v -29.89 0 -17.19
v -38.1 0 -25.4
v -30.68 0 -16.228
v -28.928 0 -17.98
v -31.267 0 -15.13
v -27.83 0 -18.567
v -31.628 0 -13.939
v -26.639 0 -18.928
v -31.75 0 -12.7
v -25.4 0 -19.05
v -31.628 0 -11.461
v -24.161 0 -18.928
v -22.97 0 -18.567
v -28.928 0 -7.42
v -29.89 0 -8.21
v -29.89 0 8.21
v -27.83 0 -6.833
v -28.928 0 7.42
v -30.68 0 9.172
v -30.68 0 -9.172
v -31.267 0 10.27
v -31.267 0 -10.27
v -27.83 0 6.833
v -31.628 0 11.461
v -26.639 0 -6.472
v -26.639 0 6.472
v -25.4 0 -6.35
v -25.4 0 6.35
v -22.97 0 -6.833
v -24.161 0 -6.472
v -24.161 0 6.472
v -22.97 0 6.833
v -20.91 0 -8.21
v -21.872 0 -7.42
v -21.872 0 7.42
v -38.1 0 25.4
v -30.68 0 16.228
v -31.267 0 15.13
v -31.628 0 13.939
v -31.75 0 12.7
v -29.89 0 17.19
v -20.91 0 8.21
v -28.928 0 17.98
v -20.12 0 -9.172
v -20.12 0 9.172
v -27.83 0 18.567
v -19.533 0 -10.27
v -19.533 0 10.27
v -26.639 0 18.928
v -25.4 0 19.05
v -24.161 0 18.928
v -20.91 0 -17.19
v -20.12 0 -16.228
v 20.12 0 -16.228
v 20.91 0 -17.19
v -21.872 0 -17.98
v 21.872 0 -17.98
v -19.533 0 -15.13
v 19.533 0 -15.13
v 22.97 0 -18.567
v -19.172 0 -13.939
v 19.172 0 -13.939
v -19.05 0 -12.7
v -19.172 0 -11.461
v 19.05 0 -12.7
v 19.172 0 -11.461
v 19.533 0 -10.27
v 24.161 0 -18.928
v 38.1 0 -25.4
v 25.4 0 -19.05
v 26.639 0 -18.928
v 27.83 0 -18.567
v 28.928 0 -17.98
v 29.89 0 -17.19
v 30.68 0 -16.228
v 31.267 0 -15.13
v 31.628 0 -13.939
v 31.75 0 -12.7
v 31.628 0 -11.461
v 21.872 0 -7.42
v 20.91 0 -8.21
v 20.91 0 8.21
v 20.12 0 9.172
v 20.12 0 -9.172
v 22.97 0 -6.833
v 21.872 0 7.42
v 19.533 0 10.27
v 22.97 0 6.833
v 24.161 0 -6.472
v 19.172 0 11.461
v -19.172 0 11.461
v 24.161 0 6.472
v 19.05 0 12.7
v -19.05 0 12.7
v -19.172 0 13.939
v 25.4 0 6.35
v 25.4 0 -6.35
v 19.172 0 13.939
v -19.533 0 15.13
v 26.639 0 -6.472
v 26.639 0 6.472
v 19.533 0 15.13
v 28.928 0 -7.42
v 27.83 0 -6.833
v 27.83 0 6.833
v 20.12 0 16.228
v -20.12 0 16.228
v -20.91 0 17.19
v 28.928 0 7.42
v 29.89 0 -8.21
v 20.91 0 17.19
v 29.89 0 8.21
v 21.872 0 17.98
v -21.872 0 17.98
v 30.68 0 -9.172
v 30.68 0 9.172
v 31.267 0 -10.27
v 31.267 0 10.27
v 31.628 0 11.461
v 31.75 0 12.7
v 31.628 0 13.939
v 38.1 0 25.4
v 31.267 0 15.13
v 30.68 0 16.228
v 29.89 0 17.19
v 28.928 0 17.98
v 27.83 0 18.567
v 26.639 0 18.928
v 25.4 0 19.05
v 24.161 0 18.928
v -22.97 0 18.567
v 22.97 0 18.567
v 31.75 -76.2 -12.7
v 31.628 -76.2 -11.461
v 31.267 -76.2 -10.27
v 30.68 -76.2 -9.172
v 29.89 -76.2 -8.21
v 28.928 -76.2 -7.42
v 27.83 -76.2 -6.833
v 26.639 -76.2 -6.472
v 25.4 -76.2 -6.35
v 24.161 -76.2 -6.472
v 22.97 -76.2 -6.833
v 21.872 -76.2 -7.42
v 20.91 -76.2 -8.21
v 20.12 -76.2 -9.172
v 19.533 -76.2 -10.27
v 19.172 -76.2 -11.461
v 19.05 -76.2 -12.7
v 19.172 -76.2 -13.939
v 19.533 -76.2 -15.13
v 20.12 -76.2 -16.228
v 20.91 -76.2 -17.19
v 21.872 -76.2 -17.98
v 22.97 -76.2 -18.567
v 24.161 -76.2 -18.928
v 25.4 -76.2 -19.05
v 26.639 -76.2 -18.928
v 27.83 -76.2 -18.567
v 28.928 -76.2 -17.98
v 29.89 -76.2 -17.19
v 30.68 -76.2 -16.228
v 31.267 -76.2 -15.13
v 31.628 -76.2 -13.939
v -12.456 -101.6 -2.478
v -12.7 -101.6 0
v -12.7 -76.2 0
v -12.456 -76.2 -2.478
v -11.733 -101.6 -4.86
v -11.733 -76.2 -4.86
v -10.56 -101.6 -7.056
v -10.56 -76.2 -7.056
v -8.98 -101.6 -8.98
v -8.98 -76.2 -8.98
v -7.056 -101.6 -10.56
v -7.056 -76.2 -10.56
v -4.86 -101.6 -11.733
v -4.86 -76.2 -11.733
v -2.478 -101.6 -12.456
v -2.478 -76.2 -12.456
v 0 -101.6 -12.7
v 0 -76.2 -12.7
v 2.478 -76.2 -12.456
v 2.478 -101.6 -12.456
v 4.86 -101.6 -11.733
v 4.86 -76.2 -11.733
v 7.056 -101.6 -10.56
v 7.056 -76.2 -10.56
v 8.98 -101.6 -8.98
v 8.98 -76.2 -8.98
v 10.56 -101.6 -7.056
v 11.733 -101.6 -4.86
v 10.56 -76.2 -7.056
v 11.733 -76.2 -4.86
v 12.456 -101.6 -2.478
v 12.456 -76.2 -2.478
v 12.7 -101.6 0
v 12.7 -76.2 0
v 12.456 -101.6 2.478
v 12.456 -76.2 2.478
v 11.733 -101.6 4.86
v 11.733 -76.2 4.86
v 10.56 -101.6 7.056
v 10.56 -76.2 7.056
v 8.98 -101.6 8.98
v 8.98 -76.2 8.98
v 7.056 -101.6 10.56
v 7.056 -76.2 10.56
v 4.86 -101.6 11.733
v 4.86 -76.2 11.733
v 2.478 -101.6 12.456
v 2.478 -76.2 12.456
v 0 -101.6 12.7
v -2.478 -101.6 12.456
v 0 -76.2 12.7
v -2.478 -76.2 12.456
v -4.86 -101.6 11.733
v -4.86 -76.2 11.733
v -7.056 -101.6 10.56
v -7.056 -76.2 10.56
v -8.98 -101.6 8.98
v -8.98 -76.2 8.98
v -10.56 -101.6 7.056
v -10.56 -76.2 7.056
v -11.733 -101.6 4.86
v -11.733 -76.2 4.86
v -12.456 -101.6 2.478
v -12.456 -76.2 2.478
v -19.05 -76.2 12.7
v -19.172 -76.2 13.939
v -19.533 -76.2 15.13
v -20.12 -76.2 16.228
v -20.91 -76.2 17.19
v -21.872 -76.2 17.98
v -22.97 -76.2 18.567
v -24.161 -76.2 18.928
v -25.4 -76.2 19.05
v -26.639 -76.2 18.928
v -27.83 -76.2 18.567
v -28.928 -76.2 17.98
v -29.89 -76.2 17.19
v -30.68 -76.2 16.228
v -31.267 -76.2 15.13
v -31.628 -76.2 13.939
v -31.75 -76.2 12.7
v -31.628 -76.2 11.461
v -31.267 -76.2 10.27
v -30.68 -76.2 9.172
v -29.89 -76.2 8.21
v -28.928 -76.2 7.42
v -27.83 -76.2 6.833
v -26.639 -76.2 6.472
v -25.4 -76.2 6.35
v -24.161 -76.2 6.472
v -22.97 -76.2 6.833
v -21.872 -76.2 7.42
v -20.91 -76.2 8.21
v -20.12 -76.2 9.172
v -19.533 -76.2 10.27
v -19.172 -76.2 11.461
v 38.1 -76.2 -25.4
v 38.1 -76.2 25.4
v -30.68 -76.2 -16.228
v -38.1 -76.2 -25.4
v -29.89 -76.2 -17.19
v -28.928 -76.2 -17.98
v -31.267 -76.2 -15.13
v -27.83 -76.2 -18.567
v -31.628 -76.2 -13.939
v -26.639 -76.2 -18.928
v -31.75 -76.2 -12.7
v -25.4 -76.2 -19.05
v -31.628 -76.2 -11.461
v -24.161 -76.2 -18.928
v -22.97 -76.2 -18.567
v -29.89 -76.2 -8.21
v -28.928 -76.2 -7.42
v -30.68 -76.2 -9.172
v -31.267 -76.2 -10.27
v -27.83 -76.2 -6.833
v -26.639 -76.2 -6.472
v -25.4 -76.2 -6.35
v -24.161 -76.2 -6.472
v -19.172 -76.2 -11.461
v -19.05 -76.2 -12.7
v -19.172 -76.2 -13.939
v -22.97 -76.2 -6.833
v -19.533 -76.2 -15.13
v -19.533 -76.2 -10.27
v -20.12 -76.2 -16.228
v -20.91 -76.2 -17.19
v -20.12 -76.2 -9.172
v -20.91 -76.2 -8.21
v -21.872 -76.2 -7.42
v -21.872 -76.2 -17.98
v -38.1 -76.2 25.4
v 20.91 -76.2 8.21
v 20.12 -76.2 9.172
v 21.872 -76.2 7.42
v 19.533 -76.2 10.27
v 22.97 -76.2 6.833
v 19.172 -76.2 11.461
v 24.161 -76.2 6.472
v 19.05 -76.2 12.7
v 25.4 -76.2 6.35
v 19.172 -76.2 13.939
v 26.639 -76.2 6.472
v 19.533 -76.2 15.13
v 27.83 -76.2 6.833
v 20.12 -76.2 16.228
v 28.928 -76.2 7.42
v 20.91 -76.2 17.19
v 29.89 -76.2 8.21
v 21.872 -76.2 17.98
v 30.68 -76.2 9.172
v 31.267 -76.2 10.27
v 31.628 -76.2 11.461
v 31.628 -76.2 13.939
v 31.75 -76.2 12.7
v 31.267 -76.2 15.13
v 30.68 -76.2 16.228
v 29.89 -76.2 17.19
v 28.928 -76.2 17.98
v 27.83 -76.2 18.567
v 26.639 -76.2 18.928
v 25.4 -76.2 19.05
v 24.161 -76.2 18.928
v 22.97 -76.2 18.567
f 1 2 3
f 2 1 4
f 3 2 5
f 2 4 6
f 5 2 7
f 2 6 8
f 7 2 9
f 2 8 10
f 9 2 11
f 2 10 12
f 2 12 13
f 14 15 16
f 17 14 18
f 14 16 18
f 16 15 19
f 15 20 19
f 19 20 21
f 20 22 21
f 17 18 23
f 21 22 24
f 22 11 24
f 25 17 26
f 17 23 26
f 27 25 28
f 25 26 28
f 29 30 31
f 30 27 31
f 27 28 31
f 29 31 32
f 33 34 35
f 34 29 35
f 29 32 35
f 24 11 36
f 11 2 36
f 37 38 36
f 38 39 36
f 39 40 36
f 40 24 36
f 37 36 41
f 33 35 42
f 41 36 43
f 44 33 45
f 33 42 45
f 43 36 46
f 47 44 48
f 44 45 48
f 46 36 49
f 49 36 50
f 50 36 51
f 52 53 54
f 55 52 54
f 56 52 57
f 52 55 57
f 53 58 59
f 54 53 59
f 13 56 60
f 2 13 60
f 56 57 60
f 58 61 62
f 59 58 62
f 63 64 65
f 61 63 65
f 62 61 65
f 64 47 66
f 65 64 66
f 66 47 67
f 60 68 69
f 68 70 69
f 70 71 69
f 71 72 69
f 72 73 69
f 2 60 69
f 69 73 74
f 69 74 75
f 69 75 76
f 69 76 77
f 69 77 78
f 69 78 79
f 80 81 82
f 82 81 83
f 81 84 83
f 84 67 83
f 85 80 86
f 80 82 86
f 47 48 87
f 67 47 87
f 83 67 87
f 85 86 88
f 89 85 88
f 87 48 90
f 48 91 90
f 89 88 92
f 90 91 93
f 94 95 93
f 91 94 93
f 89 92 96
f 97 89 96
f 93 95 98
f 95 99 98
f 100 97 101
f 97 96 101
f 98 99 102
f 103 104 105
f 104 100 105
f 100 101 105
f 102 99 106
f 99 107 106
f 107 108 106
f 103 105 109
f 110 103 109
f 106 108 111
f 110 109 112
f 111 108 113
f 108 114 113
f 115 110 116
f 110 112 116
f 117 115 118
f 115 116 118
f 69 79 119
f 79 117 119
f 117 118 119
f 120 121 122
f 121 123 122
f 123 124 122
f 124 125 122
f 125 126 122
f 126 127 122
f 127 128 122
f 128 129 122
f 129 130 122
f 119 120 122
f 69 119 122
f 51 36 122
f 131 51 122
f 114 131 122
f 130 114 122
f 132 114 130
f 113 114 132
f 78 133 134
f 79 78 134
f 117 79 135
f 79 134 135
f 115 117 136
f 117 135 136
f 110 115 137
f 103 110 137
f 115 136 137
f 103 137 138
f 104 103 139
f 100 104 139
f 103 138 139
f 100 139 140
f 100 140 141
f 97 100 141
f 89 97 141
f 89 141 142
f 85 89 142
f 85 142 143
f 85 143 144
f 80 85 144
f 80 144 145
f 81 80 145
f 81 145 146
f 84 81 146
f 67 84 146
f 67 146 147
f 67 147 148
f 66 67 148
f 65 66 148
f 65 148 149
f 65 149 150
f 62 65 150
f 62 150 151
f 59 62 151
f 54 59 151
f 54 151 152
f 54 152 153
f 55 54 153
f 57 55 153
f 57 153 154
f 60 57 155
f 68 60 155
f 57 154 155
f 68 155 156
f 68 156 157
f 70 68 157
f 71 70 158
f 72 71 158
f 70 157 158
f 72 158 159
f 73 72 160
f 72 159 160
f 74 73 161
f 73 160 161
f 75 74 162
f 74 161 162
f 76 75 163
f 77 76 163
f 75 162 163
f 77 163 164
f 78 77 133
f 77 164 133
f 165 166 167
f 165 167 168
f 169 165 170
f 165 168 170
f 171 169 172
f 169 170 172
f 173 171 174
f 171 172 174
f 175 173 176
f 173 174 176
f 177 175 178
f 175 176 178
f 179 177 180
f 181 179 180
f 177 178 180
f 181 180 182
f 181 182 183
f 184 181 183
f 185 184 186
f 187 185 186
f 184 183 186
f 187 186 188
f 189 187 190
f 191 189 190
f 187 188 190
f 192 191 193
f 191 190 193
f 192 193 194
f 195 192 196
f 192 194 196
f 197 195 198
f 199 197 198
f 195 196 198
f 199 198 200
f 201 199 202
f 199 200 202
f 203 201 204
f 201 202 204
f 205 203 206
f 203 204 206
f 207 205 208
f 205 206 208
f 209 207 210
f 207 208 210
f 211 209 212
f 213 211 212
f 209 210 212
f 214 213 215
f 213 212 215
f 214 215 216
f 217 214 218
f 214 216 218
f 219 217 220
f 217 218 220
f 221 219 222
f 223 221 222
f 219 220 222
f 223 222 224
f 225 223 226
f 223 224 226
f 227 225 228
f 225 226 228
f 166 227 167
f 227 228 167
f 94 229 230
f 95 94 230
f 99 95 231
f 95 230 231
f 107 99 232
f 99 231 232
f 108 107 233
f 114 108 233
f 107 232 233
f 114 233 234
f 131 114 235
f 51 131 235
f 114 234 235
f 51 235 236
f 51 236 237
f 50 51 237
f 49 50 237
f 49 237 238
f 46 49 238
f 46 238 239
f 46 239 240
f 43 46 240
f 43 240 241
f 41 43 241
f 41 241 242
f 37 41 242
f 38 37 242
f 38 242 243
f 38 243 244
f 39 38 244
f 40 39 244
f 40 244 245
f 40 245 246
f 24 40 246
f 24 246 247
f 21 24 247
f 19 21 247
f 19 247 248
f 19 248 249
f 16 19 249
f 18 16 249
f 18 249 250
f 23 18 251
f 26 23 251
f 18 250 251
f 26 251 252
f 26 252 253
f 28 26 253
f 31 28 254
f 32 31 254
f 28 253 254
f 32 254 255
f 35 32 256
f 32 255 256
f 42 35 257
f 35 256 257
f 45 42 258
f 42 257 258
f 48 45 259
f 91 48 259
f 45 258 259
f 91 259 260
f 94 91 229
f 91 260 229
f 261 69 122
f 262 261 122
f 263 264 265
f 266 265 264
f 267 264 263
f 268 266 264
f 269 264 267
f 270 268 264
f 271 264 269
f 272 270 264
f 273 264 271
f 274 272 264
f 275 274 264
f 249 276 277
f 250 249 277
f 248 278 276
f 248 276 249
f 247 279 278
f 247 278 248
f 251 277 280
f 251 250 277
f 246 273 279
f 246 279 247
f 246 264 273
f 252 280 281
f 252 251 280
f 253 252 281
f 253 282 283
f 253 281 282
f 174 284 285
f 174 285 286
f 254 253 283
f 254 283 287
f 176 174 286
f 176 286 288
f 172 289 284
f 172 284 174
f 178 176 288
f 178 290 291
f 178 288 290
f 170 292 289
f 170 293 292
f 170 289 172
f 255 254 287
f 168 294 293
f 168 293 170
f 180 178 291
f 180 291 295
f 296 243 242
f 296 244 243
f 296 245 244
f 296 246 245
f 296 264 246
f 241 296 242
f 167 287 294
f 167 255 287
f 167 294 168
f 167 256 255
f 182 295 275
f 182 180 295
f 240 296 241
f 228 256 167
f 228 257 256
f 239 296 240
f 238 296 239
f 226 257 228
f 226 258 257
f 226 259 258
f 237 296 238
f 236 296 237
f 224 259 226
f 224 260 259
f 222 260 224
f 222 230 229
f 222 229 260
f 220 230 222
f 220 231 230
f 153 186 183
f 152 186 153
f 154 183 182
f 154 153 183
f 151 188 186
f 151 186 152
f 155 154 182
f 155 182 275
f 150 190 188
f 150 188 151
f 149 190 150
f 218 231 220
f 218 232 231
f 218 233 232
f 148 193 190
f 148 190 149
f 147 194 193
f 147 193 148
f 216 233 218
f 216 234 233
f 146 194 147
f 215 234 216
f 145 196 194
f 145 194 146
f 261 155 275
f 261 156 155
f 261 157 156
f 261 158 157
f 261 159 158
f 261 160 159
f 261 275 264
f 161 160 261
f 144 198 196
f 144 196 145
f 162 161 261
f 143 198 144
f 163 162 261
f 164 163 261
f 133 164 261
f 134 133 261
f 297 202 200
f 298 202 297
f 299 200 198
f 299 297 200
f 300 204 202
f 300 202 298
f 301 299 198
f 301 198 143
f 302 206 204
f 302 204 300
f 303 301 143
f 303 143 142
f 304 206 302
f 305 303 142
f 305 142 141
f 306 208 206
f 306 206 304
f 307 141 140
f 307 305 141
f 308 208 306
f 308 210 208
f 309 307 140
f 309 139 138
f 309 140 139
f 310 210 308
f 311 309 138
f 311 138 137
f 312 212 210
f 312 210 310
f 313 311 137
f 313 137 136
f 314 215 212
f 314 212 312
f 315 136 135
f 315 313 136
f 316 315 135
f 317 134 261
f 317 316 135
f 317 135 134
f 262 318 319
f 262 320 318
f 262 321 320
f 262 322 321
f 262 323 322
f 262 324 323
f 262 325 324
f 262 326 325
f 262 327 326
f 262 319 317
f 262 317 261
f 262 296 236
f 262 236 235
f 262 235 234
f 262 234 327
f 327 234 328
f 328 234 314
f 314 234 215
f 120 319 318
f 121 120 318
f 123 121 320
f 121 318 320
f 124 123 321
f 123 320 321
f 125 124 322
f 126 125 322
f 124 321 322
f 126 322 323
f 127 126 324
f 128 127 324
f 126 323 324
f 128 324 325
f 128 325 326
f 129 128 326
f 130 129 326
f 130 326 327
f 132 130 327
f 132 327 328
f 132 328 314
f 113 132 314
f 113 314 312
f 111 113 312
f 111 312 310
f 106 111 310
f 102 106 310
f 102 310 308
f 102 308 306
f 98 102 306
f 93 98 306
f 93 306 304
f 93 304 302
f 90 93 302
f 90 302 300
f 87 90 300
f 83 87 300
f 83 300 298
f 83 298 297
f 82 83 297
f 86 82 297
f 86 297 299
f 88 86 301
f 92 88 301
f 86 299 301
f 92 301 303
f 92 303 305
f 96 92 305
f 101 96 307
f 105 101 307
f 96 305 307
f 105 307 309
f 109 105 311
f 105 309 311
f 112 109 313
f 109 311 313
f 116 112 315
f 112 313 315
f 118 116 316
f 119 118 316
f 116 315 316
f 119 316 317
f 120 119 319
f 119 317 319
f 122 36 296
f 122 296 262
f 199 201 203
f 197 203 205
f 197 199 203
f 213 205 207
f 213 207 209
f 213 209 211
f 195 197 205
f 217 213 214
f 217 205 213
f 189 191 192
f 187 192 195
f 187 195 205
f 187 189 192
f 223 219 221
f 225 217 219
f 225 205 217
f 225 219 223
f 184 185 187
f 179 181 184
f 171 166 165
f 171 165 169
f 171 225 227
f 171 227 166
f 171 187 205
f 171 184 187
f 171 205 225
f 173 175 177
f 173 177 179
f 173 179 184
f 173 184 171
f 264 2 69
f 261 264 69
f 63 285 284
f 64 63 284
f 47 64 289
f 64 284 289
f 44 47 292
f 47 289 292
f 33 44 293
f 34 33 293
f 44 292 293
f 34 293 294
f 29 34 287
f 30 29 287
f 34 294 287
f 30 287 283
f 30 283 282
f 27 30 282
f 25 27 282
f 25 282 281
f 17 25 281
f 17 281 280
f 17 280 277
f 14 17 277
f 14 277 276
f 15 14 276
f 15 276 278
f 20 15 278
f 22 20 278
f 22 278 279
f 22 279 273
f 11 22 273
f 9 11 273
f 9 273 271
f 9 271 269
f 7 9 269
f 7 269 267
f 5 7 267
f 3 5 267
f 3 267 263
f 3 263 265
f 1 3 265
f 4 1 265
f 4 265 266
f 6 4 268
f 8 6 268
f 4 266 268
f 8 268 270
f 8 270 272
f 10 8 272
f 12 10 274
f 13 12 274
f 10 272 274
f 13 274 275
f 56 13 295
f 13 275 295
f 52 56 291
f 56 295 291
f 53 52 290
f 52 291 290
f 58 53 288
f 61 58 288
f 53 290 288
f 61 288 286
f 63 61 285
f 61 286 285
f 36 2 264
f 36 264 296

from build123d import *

# Parameters (mm, degrees)
F0_W     = 76.2
F0_H     = 50.8
F1_DEPTH = 76.2
F2_R     = 6.35
F3_DEPTH = 76.201
F4_W     = 12.7
F4_H     = 25.4


with BuildPart() as f1:
    # F0 (on Front) → F1 (new body)
    with BuildSketch(Plane.XZ):
        Rectangle(F0_W, F0_H)
    extrude(amount=F1_DEPTH)

    # F2 (on face) → F3 (cut, through all)
    with BuildSketch(Plane.XZ.offset(76.2)):
        with Locations((-25.4, 12.7)):
            Circle(F2_R)
        with Locations((-25.4, -12.7)):
            Circle(F2_R)
        with Locations((25.4, 12.7)):
            Circle(F2_R)
        with Locations((25.4, -12.7)):
            Circle(F2_R)
    extrude(amount=-F3_DEPTH, mode=Mode.SUBTRACT)

    # F4 (on Top) → F5 (revolve)
    with BuildSketch(Plane.XY):
        with Locations((-6.35, -88.9)):
            Rectangle(F4_W, F4_H)
    revolve(axis=Axis((0, -88.9, 0), (0, -1, 0)))


solid = f1.part
